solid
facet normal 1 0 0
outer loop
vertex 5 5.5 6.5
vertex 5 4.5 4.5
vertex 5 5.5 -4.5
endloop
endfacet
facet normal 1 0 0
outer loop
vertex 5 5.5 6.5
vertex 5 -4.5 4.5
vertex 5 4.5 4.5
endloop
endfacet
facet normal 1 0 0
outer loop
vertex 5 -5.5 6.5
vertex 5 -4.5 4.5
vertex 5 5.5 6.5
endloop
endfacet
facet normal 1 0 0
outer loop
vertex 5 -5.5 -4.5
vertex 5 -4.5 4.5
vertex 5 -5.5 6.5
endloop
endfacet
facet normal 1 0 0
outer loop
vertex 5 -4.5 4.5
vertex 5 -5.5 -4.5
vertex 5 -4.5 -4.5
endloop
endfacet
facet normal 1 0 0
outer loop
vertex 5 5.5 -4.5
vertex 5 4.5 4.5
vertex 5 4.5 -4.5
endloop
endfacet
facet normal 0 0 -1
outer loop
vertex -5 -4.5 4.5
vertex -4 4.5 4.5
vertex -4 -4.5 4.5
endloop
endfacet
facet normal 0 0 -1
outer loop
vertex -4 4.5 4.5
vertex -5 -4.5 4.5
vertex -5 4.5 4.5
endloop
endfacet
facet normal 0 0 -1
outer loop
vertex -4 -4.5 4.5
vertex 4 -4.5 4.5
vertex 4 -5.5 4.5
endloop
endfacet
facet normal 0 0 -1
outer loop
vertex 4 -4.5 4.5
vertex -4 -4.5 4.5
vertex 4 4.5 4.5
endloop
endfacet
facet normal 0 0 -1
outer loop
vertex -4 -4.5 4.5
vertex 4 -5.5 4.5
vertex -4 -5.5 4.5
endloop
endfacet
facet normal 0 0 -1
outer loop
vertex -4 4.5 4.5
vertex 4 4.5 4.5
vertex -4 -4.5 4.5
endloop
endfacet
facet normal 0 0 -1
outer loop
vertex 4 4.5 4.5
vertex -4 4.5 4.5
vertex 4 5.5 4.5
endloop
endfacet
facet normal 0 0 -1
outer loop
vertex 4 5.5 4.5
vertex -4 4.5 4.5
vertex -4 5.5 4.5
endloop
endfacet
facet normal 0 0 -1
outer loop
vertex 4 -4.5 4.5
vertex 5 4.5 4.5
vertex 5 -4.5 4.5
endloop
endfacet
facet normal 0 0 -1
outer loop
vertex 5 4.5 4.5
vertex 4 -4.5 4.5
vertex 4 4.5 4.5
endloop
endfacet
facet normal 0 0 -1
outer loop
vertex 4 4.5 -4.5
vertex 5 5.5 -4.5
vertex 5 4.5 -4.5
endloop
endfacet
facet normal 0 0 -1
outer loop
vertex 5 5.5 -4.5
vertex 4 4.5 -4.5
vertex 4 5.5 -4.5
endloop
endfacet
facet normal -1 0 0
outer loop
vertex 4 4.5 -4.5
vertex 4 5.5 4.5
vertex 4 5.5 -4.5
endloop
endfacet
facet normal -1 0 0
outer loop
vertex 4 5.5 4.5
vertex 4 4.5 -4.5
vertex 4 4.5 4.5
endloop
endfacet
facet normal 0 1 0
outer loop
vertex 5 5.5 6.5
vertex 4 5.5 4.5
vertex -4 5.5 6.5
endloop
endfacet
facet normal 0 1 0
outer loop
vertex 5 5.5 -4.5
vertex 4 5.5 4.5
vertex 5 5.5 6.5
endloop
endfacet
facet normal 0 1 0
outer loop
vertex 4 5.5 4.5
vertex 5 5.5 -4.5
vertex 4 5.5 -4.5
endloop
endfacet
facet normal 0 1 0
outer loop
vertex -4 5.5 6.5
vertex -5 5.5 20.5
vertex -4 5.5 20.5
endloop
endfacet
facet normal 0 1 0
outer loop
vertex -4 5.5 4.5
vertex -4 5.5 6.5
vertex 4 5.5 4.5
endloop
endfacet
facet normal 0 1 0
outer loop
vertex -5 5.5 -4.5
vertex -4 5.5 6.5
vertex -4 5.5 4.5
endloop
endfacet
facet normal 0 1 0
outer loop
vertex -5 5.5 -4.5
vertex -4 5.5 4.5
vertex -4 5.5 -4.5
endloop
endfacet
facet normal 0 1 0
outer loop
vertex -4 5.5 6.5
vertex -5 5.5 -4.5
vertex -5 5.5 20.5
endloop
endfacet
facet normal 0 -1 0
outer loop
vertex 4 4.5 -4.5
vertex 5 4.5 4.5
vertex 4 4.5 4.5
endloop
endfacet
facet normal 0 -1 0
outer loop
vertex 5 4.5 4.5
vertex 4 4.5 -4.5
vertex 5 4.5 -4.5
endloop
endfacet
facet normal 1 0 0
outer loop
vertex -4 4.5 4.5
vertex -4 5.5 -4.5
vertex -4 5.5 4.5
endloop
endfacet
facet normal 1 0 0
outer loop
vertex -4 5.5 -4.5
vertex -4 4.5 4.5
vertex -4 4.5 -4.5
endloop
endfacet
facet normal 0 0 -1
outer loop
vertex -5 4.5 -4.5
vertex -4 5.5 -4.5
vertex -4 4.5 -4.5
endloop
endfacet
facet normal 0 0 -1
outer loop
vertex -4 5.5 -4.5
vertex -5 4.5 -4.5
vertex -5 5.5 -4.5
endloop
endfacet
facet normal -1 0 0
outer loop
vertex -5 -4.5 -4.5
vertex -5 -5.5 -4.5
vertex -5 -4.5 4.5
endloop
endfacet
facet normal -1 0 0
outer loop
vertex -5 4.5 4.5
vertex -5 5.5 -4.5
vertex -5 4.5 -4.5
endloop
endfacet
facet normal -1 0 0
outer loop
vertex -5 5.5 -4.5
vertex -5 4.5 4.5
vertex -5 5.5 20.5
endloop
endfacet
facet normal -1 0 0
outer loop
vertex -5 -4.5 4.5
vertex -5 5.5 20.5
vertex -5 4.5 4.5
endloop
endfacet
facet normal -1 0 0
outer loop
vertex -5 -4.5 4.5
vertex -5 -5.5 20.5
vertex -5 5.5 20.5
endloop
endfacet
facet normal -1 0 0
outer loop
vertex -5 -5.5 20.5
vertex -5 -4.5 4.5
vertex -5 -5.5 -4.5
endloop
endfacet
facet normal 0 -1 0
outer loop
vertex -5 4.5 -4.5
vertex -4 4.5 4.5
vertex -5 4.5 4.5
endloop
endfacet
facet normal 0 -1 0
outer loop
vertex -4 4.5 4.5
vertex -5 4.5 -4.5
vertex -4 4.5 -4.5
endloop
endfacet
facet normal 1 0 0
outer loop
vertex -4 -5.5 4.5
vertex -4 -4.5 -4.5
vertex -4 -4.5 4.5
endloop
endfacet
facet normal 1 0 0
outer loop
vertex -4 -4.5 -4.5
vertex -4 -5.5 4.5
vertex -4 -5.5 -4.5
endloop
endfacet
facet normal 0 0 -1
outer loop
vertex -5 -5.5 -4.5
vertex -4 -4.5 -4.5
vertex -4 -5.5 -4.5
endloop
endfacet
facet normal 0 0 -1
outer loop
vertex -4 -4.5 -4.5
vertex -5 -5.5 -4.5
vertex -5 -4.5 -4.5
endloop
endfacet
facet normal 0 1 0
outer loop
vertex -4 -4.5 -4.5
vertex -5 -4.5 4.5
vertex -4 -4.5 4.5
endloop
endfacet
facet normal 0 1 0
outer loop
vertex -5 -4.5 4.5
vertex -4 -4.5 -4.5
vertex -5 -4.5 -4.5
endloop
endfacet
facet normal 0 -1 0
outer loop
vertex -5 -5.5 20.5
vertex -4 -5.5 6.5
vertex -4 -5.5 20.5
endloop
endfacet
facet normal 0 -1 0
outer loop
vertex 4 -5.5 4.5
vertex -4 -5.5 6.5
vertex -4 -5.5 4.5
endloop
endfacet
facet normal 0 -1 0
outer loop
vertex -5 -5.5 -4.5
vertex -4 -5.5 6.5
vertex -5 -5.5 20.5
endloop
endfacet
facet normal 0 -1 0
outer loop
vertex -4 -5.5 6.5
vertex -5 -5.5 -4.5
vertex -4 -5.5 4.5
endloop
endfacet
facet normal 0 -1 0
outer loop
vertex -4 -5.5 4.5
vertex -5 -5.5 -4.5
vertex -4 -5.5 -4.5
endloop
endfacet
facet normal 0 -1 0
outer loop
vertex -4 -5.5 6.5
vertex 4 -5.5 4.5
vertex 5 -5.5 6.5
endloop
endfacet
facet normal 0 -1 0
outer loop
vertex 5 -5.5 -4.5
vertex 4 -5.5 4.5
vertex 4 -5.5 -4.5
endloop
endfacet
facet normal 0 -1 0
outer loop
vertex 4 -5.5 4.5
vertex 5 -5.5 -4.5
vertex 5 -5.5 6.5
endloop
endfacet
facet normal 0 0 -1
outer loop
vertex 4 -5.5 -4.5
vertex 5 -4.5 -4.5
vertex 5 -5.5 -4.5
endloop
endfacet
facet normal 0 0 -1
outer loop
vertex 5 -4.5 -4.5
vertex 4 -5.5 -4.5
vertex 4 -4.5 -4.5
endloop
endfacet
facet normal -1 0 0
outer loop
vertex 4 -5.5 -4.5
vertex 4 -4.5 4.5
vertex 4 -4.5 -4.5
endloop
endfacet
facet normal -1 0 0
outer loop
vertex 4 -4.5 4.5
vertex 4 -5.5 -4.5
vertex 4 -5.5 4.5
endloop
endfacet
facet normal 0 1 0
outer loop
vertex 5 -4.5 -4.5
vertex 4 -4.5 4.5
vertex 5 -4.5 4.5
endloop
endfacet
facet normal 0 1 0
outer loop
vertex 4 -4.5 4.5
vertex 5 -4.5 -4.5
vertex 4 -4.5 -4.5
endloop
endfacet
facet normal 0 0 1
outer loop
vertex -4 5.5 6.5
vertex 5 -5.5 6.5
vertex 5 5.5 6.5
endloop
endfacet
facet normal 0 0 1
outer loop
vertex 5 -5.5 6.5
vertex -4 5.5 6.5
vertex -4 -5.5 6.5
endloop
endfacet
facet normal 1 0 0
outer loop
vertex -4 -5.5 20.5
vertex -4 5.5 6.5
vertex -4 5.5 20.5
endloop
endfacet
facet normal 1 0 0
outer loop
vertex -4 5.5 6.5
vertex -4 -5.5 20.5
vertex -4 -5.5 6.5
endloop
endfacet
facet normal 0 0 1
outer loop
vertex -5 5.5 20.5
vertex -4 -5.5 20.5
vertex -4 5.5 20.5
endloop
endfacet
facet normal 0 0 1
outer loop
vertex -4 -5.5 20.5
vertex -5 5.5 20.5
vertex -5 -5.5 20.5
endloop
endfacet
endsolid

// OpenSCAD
// Angelo Nicolì 2023 - Licensed GPL-2.0

// Modify Input DATA to change the shape of the chair


// INPUT DATA

Table_Leg = [1,1,9];      // lenght, width and height of legs
Table_Top_Height = 2;     //  Height of theSeat

Leg_Distance_x = 9;        
Leg_Distance_y = 10;     

seat_height = 14;         // Backpost size 
seat_width = 1;           // Backpost width (x axis)


// OUTPUT DATA

translate([Leg_Distance_x*0.5,Leg_Distance_y*0.5,0])
color("PowderBlue")
cube([Table_Leg[0],Table_Leg[1],Table_Leg[2]],center=true);

translate([-Leg_Distance_x*0.5,Leg_Distance_y*0.5,0])
color("PowderBlue")
cube([Table_Leg[0],Table_Leg[1],Table_Leg[2]],center=true);

translate([-Leg_Distance_x*0.5,-Leg_Distance_y*0.5,0])
color("PowderBlue")
cube([Table_Leg[0],Table_Leg[1],Table_Leg[2]],center=true);

translate([Leg_Distance_x*0.5,-Leg_Distance_y*0.5,0])
color("PowderBlue")
cube([Table_Leg[0],Table_Leg[1],Table_Leg[2]],center=true);

Table_Upper = [Leg_Distance_x + Table_Leg[0],Leg_Distance_y +Table_Leg[1],Table_Top_Height];

seat = [seat_width,Leg_Distance_y+Table_Leg[1],seat_height];

translate([0,0,Table_Leg[2]*0.5+Table_Top_Height*0.5])
color("PowderBlue")
cube([Table_Upper[0],Table_Upper[1],Table_Upper[2]],center=true);

translate([-Table_Upper[0]*0.5+seat[0]*0.5,0,Table_Leg[2]*0.5+Table_Top_Height+seat_height*0.5])
color("YellowGreen")
cube([seat[0],seat[1],seat[2]],center=true);
